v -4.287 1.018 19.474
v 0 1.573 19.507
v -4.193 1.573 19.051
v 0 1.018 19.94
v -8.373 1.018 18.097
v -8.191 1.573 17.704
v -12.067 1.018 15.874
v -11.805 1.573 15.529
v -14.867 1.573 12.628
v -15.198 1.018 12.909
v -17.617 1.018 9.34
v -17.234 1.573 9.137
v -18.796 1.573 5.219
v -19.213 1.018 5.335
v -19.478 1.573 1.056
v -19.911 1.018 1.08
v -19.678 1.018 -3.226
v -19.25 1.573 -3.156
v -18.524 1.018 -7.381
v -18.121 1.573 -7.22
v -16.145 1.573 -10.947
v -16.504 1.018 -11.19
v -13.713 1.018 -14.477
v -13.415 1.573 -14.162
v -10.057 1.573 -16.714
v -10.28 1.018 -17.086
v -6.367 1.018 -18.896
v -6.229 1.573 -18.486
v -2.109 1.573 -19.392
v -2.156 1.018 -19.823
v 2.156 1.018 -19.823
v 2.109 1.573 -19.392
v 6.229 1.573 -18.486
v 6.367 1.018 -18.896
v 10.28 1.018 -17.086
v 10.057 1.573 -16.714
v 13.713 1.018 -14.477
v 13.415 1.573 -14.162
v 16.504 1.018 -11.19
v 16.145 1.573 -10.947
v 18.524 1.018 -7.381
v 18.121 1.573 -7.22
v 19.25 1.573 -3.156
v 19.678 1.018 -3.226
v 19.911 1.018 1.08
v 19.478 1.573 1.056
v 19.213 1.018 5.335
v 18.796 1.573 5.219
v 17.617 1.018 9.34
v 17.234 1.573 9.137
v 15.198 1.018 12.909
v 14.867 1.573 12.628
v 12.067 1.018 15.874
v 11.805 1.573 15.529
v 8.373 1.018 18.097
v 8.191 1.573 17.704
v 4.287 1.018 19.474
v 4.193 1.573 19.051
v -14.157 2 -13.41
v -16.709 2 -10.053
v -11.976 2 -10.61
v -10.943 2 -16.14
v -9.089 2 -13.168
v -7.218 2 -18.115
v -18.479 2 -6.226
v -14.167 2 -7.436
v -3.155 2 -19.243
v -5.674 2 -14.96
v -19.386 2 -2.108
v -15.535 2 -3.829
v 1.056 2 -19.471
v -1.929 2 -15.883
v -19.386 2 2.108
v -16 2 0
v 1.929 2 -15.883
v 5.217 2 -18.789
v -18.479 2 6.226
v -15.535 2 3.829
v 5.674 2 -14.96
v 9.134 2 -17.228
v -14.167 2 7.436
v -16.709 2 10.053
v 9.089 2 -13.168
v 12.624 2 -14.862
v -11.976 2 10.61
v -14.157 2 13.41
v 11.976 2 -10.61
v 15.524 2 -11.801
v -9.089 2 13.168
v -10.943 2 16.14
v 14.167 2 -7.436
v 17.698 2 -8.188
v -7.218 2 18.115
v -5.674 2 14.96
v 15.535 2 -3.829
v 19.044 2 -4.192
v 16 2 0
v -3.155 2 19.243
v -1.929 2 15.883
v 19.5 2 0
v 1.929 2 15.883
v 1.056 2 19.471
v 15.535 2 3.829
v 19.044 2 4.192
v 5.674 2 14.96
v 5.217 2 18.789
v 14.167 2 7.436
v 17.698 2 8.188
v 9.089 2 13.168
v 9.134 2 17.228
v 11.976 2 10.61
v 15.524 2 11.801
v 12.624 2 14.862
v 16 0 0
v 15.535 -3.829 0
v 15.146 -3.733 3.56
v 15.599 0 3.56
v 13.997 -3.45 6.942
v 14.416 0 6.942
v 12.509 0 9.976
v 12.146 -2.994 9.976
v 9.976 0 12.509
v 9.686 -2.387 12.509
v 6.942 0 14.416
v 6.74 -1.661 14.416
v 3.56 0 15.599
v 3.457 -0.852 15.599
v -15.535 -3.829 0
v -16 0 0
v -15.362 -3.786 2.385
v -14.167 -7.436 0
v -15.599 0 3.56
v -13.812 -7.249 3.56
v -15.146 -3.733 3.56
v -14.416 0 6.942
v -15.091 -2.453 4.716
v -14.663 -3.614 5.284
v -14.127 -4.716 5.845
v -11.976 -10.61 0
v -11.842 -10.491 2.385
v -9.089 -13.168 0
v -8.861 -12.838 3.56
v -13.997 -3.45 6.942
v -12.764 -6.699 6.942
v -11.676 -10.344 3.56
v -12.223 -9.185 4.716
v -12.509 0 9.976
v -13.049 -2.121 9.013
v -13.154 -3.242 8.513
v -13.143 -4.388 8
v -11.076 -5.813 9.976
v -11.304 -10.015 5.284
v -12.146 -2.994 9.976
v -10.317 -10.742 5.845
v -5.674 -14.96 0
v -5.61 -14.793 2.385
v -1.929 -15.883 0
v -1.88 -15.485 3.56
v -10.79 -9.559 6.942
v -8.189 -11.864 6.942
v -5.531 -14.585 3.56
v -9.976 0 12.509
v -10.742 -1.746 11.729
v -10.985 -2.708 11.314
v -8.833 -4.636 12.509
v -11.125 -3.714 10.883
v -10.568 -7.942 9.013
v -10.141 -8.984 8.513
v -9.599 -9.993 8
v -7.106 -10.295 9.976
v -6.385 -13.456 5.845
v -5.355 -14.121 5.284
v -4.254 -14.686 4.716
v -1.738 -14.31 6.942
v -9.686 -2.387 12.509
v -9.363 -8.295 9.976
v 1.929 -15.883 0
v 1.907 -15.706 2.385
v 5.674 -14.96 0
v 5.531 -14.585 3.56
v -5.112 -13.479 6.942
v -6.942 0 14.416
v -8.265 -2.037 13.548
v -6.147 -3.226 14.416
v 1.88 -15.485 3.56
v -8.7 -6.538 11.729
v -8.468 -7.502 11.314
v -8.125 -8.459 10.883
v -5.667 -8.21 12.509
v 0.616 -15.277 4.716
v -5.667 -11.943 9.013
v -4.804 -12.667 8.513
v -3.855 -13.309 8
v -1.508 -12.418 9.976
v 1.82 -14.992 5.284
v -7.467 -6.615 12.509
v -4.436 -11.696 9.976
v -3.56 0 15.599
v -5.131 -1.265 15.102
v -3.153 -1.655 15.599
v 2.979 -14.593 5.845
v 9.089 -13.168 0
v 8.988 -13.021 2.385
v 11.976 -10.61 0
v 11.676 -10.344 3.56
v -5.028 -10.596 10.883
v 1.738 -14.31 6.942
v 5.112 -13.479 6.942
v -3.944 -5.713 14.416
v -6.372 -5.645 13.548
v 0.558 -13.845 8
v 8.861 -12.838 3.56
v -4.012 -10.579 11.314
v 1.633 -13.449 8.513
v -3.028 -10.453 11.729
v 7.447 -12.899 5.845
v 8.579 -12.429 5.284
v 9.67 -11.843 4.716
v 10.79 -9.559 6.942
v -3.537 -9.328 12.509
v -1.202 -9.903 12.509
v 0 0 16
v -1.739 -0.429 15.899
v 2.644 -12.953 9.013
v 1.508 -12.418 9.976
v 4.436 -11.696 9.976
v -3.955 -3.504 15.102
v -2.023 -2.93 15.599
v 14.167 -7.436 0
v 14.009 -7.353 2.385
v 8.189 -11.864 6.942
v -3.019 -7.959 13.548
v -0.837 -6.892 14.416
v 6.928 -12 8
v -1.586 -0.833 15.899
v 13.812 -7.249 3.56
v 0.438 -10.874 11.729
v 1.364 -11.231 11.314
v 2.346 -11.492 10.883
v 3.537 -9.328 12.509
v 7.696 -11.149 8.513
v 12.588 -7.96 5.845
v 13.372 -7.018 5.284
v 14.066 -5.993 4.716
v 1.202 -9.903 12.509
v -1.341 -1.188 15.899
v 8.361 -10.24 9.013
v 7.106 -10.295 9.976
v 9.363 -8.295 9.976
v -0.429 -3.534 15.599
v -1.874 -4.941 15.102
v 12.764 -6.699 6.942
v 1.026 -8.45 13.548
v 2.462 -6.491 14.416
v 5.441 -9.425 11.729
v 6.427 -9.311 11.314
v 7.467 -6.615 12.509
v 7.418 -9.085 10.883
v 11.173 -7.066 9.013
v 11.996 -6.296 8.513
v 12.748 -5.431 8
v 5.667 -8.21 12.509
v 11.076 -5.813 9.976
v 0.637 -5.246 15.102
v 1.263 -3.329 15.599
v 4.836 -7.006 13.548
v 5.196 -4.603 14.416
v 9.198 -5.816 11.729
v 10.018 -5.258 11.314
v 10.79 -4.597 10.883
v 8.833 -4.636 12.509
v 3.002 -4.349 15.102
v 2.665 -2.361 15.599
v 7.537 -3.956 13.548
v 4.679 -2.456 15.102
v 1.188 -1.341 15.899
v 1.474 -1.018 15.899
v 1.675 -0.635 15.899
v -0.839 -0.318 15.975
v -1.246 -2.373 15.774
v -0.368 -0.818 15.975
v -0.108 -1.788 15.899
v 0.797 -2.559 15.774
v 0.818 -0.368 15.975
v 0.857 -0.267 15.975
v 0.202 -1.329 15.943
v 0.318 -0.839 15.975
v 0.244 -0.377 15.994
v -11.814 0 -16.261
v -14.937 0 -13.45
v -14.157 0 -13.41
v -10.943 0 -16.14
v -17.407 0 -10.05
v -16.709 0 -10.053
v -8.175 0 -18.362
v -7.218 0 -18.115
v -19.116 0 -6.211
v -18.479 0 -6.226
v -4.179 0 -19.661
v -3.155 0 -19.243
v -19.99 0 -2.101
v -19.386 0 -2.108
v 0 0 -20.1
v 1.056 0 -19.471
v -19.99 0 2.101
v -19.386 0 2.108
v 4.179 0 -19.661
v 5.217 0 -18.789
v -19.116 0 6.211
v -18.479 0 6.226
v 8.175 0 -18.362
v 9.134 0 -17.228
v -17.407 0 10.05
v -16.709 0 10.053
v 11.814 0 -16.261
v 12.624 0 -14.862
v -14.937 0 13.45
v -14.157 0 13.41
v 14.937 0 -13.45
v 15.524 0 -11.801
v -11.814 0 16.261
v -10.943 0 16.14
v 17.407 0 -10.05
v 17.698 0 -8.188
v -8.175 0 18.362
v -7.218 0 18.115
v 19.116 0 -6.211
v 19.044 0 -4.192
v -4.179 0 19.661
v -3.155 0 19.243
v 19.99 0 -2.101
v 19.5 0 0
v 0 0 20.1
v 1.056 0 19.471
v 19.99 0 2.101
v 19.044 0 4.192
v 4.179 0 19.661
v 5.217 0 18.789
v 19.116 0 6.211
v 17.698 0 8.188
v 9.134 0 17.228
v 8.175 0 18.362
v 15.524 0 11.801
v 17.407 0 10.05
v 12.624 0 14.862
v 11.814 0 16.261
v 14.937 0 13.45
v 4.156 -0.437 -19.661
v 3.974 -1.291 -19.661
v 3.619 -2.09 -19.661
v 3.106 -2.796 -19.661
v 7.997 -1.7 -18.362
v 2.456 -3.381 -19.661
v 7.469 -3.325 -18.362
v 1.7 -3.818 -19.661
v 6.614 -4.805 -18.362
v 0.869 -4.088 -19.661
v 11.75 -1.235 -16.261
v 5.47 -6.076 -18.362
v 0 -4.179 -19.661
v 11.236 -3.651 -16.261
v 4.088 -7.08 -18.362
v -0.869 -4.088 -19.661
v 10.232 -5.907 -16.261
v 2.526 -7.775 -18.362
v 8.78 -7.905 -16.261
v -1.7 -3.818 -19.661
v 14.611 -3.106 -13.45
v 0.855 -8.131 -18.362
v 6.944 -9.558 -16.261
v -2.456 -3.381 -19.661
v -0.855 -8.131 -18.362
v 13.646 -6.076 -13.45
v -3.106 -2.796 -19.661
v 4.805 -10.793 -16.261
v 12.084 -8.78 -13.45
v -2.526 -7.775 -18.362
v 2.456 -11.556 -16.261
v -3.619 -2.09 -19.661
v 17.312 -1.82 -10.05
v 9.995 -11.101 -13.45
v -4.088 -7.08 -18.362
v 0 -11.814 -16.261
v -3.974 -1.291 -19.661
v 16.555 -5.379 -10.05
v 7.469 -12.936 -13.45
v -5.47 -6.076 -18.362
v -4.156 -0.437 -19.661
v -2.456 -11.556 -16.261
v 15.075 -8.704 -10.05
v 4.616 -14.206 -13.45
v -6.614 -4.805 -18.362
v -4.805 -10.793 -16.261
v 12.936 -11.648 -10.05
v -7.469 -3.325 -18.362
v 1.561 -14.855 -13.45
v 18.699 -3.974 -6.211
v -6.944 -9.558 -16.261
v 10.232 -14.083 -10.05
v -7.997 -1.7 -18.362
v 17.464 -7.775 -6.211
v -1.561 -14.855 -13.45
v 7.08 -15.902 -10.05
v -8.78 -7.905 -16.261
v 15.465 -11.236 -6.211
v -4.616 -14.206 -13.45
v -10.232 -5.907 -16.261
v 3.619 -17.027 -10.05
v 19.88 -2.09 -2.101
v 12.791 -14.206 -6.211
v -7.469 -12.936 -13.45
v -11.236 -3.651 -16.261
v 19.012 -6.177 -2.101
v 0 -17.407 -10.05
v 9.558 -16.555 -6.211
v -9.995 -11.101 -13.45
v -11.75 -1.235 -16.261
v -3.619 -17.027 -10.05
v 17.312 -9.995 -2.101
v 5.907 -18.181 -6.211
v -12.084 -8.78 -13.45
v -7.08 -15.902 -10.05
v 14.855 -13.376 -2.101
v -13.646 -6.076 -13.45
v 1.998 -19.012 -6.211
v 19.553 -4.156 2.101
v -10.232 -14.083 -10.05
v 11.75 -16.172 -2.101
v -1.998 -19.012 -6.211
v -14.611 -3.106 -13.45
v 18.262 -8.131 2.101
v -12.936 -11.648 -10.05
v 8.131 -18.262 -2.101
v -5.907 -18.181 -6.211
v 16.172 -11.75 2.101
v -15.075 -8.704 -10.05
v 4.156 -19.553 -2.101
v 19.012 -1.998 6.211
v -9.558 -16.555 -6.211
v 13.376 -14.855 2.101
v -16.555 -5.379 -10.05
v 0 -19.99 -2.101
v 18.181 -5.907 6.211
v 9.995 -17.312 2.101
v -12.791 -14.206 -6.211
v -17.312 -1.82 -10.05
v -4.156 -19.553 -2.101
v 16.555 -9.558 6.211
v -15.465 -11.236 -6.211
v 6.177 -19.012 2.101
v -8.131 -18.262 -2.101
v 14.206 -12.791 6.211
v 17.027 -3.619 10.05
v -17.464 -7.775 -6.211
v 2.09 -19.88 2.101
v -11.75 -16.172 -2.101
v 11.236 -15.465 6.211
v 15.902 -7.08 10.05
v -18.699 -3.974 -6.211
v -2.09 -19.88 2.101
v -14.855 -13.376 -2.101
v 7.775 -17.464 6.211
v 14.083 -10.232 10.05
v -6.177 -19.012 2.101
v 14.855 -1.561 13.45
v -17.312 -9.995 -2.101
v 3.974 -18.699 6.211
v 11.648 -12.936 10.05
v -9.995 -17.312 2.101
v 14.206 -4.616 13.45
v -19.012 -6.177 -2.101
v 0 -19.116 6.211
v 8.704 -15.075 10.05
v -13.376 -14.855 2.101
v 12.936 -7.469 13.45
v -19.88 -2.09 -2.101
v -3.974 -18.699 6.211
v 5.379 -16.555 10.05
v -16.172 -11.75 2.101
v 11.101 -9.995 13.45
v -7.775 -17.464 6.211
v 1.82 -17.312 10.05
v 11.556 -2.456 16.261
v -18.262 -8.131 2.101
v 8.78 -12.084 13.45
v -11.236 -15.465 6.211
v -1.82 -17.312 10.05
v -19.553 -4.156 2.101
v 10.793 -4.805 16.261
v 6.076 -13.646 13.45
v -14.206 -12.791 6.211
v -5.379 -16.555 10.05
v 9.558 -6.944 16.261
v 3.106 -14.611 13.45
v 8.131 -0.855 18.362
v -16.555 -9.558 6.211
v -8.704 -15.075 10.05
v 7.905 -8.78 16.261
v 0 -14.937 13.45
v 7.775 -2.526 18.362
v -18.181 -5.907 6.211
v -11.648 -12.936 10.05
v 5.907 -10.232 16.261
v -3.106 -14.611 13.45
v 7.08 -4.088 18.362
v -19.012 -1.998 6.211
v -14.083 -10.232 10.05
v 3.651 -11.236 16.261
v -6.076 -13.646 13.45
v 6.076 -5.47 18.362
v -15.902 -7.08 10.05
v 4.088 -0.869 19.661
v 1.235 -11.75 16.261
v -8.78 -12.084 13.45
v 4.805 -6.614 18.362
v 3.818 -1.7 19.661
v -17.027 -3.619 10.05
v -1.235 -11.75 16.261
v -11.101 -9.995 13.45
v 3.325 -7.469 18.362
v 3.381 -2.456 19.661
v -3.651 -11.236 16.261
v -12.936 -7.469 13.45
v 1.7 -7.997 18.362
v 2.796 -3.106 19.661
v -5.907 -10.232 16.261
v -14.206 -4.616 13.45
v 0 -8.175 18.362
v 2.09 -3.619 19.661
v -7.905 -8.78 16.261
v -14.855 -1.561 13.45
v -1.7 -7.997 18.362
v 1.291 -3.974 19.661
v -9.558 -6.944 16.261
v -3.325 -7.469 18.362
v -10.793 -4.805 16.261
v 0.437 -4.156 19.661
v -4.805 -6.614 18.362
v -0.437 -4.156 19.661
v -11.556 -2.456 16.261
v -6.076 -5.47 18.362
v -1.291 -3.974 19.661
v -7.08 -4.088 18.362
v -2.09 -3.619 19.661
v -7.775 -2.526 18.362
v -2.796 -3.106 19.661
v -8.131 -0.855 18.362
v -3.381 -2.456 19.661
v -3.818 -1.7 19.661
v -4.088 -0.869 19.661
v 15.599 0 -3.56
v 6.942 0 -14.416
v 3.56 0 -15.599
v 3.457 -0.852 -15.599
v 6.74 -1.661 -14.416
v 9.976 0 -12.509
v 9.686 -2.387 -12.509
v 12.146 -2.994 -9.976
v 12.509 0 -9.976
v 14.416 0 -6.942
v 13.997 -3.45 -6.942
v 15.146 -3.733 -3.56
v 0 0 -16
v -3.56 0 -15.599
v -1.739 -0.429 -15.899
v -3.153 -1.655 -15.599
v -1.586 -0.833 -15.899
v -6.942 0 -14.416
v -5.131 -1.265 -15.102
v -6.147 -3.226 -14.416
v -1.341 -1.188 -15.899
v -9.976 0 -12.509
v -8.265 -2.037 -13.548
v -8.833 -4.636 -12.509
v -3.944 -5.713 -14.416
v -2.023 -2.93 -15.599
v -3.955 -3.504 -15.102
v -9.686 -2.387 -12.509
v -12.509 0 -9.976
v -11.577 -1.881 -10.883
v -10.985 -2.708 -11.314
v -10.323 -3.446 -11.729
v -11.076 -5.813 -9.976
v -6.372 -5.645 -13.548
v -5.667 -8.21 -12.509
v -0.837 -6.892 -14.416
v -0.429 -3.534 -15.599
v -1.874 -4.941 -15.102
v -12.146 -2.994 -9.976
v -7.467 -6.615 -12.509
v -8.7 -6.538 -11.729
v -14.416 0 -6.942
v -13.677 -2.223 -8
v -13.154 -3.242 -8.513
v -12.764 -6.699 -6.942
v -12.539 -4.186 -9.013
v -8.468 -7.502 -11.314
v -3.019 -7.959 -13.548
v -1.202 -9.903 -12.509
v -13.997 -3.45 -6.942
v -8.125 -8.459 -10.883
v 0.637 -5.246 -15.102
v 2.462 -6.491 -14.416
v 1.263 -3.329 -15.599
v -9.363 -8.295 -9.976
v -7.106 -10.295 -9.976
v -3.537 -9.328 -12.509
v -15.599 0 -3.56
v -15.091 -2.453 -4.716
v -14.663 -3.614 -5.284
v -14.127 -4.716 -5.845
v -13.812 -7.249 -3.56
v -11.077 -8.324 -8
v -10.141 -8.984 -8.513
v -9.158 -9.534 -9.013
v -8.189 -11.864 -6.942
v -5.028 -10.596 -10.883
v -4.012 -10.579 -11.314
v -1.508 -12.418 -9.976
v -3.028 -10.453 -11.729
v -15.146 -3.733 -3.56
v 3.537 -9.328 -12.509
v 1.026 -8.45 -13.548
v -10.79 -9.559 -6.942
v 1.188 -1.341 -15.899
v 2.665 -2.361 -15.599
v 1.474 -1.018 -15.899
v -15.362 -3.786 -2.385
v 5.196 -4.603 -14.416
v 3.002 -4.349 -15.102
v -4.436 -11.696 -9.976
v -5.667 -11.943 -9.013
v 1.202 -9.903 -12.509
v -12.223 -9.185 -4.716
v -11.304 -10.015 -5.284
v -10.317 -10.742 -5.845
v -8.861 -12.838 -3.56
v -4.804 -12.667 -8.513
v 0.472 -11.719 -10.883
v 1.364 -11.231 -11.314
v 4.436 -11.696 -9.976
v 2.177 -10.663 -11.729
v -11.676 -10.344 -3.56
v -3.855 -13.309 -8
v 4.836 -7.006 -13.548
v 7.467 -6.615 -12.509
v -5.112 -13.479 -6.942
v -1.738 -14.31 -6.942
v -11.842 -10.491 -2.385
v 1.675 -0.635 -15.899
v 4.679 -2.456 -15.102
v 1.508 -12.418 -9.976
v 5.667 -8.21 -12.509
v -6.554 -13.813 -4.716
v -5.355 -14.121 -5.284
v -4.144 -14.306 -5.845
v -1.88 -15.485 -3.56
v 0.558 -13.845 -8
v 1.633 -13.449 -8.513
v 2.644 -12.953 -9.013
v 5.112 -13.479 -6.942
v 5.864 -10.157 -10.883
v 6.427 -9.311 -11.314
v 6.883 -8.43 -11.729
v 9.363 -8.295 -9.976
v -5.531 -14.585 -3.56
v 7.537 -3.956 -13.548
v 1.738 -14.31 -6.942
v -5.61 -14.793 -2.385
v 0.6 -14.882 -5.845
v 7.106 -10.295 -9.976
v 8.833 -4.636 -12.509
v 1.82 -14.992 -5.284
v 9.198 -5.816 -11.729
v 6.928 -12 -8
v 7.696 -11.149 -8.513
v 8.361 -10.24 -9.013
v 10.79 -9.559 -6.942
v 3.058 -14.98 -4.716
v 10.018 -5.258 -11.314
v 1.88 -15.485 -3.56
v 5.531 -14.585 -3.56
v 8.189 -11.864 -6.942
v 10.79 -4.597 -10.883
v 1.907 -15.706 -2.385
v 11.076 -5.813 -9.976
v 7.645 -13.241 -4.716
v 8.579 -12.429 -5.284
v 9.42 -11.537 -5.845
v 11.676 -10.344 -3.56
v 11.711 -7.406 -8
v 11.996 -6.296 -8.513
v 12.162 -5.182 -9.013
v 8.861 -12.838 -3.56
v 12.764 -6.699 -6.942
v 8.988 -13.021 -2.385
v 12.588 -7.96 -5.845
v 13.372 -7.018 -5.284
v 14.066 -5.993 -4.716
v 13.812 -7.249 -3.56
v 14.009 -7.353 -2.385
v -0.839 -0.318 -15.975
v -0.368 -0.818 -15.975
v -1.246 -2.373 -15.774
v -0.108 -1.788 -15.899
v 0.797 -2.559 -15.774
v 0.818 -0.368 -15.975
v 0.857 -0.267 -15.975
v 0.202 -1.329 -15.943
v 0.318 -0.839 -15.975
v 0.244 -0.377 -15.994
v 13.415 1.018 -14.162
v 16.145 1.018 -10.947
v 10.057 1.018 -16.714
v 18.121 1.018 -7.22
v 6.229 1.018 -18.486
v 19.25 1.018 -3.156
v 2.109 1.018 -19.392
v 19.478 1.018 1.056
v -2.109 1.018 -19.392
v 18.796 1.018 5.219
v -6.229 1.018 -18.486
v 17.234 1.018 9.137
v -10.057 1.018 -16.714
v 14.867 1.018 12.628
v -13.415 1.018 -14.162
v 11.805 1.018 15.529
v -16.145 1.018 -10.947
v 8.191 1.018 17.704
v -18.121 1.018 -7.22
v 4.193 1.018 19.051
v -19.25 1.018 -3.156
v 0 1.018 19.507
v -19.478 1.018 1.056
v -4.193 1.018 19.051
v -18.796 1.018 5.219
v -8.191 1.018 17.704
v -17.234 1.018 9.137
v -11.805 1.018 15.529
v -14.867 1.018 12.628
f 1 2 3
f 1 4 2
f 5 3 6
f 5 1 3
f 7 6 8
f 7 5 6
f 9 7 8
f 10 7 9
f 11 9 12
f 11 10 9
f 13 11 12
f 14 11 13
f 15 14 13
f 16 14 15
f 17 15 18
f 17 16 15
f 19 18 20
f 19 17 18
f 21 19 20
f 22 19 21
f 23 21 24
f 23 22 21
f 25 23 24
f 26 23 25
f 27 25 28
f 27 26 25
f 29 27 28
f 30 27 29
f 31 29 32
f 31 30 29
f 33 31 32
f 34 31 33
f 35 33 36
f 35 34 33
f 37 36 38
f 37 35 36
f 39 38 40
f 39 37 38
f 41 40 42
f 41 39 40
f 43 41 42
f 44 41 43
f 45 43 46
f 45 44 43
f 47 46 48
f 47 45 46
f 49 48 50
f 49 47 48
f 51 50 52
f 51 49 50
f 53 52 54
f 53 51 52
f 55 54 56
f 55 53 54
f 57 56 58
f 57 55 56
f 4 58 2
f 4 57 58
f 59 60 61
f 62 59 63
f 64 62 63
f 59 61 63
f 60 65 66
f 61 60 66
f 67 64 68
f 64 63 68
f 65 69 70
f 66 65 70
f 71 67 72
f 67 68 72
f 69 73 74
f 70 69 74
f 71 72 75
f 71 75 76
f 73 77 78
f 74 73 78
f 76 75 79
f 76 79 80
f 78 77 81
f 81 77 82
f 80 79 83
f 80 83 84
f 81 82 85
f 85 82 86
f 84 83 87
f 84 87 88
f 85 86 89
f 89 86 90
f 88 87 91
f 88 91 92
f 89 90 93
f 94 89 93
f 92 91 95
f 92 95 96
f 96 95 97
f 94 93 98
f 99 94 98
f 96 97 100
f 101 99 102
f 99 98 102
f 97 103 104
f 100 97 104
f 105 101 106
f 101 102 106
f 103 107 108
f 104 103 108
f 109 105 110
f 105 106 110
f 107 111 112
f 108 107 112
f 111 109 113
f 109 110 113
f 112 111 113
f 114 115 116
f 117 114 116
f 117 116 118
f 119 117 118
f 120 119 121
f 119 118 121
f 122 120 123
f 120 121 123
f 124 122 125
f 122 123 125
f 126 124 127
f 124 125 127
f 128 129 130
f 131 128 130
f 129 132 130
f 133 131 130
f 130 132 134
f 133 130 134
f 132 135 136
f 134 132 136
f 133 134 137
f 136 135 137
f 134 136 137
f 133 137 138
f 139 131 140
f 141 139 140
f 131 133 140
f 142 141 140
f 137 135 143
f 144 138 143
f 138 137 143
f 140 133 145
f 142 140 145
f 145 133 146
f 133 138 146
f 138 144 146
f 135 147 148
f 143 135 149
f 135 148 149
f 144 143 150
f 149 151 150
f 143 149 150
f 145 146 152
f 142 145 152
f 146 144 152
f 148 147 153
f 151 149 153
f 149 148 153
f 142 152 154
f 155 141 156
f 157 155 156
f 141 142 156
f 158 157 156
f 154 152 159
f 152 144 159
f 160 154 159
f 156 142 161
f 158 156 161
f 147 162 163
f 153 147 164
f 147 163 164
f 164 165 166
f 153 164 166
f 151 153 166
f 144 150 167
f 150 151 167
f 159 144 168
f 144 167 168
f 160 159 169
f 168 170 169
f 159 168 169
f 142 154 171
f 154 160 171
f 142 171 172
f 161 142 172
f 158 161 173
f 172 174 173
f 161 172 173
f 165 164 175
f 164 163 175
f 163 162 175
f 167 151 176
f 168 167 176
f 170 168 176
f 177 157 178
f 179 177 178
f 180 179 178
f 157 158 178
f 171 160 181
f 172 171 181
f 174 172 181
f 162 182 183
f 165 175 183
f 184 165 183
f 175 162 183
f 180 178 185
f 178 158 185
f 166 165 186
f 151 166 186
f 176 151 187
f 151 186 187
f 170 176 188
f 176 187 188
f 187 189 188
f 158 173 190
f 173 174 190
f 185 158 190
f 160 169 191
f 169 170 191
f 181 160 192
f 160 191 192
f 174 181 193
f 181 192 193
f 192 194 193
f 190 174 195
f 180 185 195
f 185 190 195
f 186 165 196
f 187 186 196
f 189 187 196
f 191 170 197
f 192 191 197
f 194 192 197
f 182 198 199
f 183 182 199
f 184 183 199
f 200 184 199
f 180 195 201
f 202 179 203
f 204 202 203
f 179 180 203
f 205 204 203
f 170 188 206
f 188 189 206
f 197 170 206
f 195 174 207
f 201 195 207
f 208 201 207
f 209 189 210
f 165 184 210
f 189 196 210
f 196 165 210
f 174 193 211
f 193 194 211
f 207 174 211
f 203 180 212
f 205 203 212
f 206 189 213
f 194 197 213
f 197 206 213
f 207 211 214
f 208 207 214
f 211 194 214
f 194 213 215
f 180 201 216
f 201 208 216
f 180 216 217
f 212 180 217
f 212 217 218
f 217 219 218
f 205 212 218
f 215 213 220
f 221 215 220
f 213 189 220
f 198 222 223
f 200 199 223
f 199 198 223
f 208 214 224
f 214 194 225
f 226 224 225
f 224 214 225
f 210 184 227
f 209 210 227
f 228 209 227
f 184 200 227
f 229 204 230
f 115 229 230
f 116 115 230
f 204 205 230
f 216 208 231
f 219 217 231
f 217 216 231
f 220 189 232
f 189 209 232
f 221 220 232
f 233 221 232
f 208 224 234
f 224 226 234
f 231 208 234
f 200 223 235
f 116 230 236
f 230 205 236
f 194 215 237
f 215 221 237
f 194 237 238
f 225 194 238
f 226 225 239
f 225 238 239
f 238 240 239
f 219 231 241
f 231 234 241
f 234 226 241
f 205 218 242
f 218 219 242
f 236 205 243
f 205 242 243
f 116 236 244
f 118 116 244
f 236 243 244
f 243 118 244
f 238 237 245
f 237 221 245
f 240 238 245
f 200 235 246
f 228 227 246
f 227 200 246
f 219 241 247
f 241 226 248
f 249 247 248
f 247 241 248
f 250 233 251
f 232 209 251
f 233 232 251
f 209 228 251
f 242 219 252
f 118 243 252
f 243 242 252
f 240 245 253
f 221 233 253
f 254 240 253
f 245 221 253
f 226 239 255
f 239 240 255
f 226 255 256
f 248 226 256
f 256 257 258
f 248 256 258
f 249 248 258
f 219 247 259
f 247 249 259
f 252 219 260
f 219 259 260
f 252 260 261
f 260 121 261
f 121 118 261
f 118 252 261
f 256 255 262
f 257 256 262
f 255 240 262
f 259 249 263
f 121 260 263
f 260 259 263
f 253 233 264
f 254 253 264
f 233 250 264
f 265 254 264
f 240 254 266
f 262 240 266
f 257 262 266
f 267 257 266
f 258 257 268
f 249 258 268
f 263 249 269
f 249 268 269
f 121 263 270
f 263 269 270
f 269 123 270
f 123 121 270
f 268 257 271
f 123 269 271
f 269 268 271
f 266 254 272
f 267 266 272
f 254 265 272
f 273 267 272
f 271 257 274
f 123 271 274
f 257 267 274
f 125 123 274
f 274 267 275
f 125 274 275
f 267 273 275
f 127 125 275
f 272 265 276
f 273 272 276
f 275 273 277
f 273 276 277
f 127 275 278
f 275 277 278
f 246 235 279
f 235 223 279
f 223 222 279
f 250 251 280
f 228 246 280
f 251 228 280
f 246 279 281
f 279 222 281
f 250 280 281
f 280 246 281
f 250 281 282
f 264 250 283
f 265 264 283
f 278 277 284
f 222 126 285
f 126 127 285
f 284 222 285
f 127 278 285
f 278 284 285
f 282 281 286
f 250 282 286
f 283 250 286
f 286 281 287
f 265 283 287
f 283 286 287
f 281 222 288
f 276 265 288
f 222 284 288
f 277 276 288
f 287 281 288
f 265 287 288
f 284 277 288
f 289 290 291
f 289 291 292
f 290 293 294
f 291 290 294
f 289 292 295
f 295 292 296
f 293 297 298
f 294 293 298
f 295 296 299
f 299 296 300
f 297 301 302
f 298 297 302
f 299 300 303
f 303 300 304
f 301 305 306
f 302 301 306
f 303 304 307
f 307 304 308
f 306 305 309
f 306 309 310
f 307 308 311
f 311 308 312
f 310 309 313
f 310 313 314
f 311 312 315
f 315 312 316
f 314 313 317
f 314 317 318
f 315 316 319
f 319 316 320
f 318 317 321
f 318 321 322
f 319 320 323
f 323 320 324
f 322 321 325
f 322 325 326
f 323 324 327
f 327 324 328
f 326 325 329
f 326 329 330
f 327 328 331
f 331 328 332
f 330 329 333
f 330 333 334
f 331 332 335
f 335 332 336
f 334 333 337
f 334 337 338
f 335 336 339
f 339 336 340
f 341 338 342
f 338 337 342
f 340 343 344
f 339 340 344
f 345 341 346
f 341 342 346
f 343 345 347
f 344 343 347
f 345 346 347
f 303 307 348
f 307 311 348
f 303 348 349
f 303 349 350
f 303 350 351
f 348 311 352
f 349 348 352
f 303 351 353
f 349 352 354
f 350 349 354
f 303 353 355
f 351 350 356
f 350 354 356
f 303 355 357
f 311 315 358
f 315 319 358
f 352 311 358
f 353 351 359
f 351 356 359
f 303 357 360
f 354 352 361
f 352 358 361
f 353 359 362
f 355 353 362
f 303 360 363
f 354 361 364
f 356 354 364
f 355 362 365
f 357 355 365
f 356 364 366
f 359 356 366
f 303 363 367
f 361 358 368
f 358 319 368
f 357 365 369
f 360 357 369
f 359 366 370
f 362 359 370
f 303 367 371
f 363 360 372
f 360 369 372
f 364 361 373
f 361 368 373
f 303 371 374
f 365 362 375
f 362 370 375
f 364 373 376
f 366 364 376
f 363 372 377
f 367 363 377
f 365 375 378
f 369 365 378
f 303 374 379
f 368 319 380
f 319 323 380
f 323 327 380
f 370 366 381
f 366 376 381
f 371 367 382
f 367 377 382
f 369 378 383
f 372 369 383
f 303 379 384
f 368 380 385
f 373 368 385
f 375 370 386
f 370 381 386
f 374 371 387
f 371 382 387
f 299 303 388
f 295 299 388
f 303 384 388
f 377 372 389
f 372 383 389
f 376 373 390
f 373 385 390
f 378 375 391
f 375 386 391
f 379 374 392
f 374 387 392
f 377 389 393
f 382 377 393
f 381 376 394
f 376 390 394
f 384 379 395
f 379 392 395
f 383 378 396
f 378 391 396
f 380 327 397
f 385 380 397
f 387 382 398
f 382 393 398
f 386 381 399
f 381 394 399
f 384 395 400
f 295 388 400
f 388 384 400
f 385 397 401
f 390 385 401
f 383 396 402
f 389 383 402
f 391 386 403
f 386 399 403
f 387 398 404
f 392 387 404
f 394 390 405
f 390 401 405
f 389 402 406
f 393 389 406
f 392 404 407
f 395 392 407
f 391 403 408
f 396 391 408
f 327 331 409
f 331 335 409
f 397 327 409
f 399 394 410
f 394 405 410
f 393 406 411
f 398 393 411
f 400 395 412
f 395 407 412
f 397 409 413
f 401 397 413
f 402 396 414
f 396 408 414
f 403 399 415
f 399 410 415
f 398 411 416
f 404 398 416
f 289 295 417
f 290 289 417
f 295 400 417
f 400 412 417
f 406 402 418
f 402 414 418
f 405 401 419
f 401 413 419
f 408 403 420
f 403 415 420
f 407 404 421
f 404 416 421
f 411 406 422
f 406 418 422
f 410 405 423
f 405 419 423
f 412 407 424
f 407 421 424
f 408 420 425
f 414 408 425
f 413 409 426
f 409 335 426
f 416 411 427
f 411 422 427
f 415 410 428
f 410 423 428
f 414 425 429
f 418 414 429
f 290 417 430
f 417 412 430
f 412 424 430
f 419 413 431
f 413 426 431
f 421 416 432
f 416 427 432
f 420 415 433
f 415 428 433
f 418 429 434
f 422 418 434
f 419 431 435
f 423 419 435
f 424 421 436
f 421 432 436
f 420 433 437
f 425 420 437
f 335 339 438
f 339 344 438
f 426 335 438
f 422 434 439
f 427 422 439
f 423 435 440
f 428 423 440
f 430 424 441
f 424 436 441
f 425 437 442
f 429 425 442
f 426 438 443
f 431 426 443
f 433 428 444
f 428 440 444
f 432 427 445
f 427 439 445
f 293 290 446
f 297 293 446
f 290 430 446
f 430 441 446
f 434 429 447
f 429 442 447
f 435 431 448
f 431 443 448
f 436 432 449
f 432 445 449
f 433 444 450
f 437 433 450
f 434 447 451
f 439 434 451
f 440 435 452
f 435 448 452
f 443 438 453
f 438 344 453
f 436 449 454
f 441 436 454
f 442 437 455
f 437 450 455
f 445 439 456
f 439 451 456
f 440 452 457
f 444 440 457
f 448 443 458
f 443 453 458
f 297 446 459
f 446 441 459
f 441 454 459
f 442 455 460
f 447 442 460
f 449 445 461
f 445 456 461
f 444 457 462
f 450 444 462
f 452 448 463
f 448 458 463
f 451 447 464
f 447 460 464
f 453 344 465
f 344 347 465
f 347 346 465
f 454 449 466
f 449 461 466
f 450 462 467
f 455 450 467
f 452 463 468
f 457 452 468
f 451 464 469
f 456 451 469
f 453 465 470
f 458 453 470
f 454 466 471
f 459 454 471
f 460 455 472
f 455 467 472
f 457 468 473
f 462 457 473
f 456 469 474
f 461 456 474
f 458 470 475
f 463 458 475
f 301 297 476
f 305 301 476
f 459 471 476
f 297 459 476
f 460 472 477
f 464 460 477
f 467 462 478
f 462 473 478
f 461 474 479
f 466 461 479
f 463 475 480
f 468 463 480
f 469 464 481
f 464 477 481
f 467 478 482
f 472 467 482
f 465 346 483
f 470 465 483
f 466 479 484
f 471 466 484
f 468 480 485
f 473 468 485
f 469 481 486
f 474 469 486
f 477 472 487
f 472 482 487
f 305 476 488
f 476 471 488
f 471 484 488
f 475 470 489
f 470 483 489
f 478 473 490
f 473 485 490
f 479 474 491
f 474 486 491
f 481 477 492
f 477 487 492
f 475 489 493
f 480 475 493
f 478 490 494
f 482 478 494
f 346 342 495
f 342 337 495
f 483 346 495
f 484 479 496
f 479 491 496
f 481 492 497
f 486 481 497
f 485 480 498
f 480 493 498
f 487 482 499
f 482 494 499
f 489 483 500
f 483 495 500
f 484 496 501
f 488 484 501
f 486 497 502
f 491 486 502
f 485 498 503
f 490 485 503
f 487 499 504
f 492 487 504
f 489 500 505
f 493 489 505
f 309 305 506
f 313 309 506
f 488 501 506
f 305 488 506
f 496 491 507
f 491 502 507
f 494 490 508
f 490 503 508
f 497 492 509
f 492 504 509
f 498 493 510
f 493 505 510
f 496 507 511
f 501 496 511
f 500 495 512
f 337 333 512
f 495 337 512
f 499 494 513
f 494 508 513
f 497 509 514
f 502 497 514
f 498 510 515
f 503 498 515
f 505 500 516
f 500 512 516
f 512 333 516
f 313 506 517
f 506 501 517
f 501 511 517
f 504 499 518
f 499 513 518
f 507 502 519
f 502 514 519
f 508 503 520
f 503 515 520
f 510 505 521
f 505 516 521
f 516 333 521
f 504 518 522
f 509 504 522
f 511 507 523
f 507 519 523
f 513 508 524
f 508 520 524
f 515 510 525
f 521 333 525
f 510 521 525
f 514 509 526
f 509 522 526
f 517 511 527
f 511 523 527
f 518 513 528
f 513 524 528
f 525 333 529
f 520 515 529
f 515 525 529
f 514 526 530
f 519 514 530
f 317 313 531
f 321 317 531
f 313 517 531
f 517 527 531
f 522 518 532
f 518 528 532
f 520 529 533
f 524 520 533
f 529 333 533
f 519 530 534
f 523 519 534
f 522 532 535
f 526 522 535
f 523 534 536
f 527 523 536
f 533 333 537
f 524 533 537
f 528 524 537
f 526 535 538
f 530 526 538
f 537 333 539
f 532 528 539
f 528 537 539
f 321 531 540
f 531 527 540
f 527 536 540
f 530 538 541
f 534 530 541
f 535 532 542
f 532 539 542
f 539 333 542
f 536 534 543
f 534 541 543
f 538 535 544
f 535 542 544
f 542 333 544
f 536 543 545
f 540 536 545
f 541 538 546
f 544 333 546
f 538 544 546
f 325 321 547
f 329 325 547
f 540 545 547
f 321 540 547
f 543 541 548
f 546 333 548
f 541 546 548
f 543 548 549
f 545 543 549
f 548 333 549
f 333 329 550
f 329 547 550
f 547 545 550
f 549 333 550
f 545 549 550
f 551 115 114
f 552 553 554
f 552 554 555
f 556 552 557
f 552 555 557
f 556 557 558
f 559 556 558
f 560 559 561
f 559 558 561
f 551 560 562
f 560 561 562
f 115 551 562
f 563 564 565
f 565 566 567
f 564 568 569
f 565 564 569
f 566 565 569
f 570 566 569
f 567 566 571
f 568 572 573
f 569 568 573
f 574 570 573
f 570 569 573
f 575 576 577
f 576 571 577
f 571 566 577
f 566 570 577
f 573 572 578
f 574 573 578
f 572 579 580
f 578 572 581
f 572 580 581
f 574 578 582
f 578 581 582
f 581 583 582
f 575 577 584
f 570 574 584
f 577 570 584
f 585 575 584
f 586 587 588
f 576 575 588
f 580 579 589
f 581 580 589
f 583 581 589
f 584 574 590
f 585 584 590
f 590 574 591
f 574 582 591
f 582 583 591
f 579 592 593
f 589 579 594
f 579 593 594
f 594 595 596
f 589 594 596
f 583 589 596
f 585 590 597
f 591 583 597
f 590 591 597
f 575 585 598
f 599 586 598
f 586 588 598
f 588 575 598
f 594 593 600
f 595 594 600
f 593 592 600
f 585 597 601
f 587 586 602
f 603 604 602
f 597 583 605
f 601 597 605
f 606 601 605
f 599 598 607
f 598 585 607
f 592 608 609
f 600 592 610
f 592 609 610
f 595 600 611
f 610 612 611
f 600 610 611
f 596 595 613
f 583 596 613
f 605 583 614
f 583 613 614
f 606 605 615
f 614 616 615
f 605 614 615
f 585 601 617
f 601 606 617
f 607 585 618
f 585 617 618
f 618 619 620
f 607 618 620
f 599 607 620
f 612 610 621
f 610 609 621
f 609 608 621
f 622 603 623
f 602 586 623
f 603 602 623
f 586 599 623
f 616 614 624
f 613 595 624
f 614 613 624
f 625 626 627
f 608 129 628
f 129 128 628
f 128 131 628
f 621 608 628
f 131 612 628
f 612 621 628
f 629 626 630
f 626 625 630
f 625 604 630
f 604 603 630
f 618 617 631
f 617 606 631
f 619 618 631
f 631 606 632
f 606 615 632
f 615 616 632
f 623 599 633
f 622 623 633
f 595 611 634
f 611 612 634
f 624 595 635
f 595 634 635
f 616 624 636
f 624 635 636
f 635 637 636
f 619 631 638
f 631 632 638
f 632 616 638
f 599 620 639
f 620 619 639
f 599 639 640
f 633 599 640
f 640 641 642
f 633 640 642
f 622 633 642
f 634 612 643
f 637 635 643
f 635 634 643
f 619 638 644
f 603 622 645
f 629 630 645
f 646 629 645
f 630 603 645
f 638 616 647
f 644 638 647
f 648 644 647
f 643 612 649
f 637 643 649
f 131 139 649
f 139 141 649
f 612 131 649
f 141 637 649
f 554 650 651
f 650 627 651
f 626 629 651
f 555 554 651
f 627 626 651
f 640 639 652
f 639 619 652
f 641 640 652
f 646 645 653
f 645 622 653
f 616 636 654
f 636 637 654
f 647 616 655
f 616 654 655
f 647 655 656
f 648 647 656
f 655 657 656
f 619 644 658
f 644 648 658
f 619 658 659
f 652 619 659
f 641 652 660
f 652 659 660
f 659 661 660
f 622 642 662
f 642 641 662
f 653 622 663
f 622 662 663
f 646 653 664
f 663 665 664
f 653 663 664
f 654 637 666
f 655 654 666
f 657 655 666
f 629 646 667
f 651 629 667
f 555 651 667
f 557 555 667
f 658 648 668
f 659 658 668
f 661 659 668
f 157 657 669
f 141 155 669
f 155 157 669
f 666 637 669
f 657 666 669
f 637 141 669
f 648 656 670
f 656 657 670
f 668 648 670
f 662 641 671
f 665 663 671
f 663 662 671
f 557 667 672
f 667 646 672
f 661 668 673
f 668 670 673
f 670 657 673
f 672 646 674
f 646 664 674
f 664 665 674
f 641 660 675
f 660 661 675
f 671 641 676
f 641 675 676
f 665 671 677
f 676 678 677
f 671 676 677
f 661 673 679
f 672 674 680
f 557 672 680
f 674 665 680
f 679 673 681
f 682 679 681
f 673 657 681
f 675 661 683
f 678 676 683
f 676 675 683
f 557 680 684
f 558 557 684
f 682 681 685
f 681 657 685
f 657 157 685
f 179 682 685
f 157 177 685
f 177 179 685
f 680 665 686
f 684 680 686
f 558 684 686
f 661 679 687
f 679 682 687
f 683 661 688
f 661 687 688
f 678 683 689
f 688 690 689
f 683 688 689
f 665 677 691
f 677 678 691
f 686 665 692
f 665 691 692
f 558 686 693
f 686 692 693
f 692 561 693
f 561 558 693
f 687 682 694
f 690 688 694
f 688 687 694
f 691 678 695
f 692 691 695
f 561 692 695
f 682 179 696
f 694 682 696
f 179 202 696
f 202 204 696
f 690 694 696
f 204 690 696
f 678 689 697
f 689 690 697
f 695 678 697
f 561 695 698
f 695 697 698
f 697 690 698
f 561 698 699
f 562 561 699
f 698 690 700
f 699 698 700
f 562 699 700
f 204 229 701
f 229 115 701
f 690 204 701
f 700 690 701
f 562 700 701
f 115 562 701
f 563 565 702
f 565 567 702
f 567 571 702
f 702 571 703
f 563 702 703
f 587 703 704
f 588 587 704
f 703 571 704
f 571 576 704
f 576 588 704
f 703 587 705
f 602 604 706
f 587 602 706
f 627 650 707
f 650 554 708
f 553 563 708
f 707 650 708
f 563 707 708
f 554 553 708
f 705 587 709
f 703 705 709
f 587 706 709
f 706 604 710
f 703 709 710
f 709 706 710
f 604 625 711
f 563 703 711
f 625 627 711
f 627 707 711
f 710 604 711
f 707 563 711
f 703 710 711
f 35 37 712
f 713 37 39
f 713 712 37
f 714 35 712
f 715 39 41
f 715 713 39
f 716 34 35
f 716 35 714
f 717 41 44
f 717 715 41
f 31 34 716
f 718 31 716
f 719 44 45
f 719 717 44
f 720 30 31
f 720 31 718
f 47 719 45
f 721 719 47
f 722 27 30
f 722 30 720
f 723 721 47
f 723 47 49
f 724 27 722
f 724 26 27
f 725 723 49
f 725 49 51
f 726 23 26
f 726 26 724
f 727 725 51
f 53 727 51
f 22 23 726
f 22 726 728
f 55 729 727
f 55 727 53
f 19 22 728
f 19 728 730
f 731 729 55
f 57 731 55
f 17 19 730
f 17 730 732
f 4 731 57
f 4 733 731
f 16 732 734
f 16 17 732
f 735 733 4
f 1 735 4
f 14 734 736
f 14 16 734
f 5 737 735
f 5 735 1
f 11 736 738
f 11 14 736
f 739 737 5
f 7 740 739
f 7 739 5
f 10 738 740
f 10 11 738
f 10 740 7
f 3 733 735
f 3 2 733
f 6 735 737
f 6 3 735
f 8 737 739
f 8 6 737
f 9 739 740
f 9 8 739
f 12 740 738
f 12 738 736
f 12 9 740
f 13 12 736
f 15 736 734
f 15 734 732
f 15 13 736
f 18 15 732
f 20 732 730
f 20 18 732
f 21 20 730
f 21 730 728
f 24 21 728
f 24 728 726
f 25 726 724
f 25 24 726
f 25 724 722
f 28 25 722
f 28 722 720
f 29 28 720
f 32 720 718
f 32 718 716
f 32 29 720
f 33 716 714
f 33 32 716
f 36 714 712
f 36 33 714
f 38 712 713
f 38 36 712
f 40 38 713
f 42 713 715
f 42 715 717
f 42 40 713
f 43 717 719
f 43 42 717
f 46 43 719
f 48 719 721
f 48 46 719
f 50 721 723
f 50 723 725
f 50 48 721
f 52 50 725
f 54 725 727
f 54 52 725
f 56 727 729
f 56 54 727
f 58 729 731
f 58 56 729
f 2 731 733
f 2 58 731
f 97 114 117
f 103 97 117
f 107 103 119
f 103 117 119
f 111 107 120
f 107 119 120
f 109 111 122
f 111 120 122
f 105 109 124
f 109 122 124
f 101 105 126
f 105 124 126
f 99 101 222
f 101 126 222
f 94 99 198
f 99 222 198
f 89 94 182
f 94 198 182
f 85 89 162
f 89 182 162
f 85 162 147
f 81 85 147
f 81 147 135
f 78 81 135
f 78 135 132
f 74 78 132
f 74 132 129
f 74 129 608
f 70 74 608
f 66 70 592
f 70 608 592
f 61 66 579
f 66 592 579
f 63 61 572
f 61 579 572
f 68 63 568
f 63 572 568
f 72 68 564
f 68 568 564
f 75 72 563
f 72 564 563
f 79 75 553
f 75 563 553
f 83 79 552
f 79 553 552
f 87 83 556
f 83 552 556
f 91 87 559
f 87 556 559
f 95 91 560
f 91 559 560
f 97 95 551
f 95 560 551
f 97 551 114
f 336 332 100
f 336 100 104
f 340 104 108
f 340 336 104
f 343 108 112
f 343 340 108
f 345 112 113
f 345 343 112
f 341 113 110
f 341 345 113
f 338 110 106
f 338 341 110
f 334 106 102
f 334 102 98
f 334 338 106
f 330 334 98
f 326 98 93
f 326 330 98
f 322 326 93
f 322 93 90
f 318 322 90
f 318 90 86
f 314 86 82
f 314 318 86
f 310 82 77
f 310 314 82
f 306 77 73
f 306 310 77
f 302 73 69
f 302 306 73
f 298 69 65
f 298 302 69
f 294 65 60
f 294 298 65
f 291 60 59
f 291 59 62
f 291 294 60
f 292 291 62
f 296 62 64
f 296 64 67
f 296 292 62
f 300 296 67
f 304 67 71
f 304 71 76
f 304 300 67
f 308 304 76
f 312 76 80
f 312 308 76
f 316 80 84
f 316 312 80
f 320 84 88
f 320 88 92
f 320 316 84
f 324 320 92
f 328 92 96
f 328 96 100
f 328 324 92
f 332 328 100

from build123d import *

# Parameters (mm, degrees)
F1_ANGLE = 180
F3_R     = 19.5
F3_R_2   = 16
F4_DEPTH = 2


with BuildPart() as f1:
    # F0 (on Front) → F1 (revolve)
    with BuildSketch(Plane.XZ):
        with BuildLine():
            ThreePointArc((0, -20.1), (20.1, 0), (0, 20.1))
            Line((0, 20.1), (0, -20.1))
        make_face()
    revolve(axis=Axis((0, 0, 0), (0, 0, -1)), revolution_arc=F1_ANGLE)

    # F3 (on Front) → F4 (join)
    with BuildSketch(Plane.XZ):
        Circle(F3_R)
        Circle(F3_R_2, mode=Mode.SUBTRACT)
    extrude(amount=-F4_DEPTH)

    # F2 (on Front) → F7 (revolve, cut)
    with BuildSketch(Plane.XZ):
        with BuildLine():
            ThreePointArc((16, 0), (11.313708, 11.313708), (0, 16))
            Line((0, 16), (0, 0))
            Line((0, 0), (0, -16))
            ThreePointArc((0, -16), (11.313708, -11.313708), (16, 0))
        make_face()
    revolve(axis=Axis((0, 0, 8), (0, 0, 1)), mode=Mode.SUBTRACT)


with BuildPart() as f6:
    # F5 (on Right) → F6 (revolve)
    with BuildSketch(Plane.YZ):
        Polygon((1.017524, 19.506669), (1.572773, 19.506669), (1.017524, 19.940296), align=None)
    revolve(axis=Axis((0, -5.369565, 0), (0, -1, 0)))


solid = Compound([f1.part, f6.part])
